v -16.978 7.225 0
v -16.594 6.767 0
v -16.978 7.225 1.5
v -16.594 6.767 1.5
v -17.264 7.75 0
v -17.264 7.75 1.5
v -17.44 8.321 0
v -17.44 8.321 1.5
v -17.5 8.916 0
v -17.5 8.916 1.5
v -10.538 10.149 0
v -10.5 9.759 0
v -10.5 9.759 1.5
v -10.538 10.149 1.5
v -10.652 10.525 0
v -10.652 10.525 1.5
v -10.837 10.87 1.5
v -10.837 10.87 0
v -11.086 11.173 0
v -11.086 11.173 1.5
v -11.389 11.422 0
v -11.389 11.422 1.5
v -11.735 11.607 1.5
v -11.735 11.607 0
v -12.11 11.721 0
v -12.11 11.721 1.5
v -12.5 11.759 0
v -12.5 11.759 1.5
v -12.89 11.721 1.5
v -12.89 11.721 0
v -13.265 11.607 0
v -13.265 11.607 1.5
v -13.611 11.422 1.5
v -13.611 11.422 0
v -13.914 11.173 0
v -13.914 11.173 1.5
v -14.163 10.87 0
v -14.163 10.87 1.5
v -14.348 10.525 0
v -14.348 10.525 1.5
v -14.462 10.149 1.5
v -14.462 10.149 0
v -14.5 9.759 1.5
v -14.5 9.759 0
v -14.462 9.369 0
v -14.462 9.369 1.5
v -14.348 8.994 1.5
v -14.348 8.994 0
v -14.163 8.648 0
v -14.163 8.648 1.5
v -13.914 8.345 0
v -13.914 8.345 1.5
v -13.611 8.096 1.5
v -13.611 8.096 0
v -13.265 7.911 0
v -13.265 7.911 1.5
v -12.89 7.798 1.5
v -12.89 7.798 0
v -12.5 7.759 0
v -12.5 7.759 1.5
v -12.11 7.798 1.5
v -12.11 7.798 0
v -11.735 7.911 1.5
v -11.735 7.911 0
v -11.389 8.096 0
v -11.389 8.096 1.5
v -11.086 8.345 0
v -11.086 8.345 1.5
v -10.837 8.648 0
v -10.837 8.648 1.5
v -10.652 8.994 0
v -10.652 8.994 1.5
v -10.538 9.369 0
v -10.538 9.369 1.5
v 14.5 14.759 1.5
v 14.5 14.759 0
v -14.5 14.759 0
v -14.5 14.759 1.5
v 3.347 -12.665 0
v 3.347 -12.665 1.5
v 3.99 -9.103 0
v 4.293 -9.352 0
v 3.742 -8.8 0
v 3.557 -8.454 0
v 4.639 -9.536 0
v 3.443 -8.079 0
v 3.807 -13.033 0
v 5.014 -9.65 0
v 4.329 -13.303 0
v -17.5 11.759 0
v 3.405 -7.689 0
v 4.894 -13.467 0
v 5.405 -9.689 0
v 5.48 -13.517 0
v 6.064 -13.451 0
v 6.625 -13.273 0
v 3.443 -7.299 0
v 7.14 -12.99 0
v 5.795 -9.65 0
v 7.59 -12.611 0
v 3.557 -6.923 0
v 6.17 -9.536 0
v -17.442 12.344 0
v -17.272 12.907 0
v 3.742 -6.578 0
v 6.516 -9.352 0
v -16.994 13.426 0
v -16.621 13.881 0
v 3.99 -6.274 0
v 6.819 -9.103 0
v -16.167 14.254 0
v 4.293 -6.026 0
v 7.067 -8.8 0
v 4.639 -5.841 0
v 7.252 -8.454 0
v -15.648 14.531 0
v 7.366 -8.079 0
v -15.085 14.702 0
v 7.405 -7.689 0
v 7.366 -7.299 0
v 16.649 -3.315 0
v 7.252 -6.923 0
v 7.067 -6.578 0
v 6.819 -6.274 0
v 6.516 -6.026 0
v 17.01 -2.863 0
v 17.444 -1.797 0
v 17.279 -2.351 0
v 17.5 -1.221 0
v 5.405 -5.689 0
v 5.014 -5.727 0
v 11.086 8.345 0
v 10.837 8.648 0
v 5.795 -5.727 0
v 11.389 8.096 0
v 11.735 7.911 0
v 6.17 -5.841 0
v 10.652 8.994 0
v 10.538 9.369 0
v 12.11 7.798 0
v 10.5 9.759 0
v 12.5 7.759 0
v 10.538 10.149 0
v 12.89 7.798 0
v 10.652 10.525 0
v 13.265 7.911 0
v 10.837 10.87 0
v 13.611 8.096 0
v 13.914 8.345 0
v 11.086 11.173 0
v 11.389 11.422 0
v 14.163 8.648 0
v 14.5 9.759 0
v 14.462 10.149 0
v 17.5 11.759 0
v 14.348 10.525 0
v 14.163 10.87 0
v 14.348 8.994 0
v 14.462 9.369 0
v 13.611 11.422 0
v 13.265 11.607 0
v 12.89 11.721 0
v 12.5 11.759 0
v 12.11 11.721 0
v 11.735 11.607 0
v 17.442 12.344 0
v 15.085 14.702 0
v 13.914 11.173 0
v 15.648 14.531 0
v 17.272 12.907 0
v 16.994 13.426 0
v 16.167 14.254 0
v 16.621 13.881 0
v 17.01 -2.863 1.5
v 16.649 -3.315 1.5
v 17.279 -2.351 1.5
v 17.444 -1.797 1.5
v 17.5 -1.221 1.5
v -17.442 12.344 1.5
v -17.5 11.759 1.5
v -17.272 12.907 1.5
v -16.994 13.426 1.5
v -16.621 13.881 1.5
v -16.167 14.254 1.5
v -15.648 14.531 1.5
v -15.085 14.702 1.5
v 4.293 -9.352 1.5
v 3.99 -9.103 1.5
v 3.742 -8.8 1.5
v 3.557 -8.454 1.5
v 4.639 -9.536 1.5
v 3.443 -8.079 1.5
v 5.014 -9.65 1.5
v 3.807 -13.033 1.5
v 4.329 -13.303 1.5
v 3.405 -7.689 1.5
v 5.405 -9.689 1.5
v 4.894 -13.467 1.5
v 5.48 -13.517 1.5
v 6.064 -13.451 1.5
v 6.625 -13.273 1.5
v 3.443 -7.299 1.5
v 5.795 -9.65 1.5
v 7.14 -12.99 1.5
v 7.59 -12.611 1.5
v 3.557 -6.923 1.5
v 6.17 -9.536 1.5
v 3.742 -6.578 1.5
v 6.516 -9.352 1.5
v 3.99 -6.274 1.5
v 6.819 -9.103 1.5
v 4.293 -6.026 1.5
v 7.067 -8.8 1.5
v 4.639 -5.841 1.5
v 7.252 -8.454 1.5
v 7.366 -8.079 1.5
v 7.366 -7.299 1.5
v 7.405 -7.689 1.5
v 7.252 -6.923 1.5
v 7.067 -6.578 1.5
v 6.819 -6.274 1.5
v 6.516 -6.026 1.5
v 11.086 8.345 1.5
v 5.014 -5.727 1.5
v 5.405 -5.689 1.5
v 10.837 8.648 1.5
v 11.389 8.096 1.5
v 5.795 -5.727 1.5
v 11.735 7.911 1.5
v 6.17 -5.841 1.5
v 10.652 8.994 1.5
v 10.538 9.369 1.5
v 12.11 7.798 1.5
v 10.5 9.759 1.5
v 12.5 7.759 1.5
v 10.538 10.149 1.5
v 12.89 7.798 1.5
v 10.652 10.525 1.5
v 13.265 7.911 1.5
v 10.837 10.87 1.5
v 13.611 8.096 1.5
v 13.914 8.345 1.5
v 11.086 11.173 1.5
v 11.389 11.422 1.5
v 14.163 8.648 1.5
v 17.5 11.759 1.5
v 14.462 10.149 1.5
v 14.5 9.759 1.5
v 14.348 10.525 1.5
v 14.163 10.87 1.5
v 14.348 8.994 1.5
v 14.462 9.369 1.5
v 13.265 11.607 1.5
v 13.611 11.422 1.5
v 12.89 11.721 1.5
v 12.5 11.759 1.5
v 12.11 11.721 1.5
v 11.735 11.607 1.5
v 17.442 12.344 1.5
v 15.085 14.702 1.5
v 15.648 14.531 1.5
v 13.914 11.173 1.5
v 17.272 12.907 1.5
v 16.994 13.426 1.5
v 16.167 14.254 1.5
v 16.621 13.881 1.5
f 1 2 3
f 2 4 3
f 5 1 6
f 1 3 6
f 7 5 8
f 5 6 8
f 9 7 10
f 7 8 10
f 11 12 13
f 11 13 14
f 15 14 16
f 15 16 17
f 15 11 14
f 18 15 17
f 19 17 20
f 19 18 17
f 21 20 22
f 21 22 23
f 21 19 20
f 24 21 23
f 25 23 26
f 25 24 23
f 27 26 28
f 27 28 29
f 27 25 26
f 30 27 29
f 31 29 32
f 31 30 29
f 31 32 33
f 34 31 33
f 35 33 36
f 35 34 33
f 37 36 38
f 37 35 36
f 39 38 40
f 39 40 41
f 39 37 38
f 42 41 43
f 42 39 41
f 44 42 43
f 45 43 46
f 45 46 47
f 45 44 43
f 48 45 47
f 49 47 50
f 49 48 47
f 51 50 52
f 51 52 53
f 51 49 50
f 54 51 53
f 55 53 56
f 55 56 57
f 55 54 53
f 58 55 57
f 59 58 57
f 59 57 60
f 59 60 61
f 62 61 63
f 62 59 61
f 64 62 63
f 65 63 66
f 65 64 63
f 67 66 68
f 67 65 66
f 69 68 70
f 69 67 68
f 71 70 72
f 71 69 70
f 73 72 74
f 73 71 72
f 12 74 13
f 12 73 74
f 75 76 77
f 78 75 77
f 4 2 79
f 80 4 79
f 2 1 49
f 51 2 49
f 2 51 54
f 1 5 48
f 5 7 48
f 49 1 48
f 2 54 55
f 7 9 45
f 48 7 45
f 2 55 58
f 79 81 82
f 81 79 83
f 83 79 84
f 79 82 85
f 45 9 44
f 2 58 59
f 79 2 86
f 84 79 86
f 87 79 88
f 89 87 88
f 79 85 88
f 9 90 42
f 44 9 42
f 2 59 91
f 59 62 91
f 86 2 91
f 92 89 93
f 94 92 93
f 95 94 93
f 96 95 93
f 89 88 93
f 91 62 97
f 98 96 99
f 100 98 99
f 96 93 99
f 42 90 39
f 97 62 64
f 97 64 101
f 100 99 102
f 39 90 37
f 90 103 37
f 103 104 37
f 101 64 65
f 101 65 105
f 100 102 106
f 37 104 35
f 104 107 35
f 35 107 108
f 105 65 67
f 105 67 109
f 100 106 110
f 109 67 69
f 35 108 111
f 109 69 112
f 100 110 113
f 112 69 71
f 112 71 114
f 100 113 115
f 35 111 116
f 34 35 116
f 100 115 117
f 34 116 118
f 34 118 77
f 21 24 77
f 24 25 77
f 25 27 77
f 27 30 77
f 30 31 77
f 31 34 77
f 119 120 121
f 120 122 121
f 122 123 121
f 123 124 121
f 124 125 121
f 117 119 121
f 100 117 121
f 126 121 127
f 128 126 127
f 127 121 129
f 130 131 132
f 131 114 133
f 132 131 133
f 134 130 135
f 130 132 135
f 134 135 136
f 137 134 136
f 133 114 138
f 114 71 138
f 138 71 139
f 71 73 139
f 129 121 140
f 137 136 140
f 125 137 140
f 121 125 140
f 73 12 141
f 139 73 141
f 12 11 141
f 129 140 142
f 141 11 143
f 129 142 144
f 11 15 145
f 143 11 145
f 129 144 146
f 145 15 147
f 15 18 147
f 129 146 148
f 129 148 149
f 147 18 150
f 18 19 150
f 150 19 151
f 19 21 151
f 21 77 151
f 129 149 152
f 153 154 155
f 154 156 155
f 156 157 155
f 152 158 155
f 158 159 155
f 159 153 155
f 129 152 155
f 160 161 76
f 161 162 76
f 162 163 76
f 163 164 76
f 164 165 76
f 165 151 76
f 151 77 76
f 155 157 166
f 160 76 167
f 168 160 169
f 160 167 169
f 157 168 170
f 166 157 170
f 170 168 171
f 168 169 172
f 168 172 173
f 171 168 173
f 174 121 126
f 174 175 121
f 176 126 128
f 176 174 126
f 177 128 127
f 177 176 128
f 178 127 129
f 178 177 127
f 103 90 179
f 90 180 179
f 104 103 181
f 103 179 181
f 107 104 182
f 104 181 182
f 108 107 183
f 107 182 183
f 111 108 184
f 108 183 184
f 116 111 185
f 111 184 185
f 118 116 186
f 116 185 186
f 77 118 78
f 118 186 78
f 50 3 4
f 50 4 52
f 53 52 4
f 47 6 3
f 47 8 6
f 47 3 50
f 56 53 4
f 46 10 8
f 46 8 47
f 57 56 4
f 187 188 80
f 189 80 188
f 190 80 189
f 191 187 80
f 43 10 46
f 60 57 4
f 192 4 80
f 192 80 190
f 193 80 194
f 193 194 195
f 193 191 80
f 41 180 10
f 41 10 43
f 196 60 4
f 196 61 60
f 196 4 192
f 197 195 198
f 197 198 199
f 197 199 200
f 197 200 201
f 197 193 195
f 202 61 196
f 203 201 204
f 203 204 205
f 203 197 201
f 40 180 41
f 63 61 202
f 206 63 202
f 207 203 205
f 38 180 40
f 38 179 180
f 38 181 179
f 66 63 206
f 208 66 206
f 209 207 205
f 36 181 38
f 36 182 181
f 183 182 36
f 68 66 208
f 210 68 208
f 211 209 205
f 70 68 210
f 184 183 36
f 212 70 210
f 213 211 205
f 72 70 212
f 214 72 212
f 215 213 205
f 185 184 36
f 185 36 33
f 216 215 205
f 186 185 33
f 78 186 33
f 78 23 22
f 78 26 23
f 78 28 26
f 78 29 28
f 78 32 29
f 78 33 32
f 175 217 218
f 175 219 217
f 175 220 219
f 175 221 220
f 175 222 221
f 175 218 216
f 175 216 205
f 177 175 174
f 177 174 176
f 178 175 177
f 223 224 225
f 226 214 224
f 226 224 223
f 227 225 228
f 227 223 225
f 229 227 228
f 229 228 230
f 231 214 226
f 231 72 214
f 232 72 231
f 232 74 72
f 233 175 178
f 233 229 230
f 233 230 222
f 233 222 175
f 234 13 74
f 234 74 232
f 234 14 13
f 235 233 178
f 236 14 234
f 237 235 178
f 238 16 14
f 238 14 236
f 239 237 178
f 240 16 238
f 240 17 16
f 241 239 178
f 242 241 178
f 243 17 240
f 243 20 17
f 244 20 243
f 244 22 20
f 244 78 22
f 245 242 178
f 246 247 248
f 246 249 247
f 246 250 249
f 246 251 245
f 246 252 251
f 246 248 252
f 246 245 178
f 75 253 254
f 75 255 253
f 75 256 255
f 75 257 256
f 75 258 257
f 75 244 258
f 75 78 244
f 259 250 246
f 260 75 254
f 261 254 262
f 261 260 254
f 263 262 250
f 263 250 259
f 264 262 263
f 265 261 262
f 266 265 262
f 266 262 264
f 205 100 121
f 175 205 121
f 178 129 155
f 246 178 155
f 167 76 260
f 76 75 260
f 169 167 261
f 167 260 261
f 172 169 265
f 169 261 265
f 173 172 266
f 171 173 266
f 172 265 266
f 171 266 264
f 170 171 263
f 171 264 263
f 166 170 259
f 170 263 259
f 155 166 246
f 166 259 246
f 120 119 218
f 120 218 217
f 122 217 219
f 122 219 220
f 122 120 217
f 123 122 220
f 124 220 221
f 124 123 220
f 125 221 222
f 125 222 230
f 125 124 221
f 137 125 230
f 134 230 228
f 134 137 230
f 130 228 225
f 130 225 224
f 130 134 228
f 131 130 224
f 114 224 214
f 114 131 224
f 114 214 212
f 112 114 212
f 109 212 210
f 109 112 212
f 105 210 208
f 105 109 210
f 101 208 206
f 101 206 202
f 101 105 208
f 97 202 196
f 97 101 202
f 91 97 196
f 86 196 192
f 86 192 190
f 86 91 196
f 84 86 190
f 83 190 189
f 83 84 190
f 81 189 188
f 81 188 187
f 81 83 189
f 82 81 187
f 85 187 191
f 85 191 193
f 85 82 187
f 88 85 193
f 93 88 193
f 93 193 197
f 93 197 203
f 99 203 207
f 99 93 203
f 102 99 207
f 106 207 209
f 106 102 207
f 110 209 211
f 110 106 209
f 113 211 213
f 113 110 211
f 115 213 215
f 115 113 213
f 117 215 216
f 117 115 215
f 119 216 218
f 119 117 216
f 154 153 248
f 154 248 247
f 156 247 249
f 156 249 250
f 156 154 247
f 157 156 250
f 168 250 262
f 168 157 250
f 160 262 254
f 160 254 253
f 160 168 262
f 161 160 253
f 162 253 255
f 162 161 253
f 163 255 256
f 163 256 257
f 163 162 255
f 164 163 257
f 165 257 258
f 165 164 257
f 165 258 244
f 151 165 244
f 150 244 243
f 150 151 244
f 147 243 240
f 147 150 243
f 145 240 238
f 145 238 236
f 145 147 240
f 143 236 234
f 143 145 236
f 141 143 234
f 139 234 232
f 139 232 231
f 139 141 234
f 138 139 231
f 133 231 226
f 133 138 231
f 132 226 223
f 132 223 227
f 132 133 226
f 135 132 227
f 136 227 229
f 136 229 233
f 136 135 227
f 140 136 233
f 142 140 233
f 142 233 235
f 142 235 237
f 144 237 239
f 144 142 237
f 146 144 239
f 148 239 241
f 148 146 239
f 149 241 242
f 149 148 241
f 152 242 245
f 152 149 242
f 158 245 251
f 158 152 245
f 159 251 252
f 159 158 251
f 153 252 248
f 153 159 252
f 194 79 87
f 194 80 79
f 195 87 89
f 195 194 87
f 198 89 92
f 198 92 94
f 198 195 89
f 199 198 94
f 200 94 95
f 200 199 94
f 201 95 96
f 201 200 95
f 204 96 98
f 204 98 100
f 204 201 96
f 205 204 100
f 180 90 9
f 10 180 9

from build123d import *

# Parameters (mm, degrees)
SKETCH_1_R      = 2
EXTRUDE_1_DEPTH = 1.5
FILLET_1_R      = 3


with BuildPart() as part:
    # ｽｹｯﾁ1 → ﾎﾞｽ - 押し出し1 (new body)
    with BuildSketch(Plane.XY):
        Polygon((-17.5, 7.650184139), (5.495827016, -14.759182375), (17.5, -2.440856231), (17.5, 14.759182375), (-17.5, 14.759182375), align=None)
        with Locations((5.404503628, -7.688704312)):
            Circle(SKETCH_1_R, mode=Mode.SUBTRACT)
        with Locations((-12.5, 9.759182375)):
            Circle(SKETCH_1_R, mode=Mode.SUBTRACT)
        with Locations((12.5, 9.759182375)):
            Circle(SKETCH_1_R, mode=Mode.SUBTRACT)
    extrude(amount=EXTRUDE_1_DEPTH)

    # ﾌｨﾚｯﾄ1
    fillet_1_edges = [part.edges().sort_by_distance(p)[0] for p in [
        (-17.5, 7.650184139, 0.75),
        (-17.5, 14.759182375, 0.75),
        (17.5, 14.759182375, 0.75),
        (17.5, -2.440856231, 0.75),
        (5.495827016, -14.759182375, 0.75),
    ]]
    fillet(fillet_1_edges, radius=FILLET_1_R)


solid = part.part
